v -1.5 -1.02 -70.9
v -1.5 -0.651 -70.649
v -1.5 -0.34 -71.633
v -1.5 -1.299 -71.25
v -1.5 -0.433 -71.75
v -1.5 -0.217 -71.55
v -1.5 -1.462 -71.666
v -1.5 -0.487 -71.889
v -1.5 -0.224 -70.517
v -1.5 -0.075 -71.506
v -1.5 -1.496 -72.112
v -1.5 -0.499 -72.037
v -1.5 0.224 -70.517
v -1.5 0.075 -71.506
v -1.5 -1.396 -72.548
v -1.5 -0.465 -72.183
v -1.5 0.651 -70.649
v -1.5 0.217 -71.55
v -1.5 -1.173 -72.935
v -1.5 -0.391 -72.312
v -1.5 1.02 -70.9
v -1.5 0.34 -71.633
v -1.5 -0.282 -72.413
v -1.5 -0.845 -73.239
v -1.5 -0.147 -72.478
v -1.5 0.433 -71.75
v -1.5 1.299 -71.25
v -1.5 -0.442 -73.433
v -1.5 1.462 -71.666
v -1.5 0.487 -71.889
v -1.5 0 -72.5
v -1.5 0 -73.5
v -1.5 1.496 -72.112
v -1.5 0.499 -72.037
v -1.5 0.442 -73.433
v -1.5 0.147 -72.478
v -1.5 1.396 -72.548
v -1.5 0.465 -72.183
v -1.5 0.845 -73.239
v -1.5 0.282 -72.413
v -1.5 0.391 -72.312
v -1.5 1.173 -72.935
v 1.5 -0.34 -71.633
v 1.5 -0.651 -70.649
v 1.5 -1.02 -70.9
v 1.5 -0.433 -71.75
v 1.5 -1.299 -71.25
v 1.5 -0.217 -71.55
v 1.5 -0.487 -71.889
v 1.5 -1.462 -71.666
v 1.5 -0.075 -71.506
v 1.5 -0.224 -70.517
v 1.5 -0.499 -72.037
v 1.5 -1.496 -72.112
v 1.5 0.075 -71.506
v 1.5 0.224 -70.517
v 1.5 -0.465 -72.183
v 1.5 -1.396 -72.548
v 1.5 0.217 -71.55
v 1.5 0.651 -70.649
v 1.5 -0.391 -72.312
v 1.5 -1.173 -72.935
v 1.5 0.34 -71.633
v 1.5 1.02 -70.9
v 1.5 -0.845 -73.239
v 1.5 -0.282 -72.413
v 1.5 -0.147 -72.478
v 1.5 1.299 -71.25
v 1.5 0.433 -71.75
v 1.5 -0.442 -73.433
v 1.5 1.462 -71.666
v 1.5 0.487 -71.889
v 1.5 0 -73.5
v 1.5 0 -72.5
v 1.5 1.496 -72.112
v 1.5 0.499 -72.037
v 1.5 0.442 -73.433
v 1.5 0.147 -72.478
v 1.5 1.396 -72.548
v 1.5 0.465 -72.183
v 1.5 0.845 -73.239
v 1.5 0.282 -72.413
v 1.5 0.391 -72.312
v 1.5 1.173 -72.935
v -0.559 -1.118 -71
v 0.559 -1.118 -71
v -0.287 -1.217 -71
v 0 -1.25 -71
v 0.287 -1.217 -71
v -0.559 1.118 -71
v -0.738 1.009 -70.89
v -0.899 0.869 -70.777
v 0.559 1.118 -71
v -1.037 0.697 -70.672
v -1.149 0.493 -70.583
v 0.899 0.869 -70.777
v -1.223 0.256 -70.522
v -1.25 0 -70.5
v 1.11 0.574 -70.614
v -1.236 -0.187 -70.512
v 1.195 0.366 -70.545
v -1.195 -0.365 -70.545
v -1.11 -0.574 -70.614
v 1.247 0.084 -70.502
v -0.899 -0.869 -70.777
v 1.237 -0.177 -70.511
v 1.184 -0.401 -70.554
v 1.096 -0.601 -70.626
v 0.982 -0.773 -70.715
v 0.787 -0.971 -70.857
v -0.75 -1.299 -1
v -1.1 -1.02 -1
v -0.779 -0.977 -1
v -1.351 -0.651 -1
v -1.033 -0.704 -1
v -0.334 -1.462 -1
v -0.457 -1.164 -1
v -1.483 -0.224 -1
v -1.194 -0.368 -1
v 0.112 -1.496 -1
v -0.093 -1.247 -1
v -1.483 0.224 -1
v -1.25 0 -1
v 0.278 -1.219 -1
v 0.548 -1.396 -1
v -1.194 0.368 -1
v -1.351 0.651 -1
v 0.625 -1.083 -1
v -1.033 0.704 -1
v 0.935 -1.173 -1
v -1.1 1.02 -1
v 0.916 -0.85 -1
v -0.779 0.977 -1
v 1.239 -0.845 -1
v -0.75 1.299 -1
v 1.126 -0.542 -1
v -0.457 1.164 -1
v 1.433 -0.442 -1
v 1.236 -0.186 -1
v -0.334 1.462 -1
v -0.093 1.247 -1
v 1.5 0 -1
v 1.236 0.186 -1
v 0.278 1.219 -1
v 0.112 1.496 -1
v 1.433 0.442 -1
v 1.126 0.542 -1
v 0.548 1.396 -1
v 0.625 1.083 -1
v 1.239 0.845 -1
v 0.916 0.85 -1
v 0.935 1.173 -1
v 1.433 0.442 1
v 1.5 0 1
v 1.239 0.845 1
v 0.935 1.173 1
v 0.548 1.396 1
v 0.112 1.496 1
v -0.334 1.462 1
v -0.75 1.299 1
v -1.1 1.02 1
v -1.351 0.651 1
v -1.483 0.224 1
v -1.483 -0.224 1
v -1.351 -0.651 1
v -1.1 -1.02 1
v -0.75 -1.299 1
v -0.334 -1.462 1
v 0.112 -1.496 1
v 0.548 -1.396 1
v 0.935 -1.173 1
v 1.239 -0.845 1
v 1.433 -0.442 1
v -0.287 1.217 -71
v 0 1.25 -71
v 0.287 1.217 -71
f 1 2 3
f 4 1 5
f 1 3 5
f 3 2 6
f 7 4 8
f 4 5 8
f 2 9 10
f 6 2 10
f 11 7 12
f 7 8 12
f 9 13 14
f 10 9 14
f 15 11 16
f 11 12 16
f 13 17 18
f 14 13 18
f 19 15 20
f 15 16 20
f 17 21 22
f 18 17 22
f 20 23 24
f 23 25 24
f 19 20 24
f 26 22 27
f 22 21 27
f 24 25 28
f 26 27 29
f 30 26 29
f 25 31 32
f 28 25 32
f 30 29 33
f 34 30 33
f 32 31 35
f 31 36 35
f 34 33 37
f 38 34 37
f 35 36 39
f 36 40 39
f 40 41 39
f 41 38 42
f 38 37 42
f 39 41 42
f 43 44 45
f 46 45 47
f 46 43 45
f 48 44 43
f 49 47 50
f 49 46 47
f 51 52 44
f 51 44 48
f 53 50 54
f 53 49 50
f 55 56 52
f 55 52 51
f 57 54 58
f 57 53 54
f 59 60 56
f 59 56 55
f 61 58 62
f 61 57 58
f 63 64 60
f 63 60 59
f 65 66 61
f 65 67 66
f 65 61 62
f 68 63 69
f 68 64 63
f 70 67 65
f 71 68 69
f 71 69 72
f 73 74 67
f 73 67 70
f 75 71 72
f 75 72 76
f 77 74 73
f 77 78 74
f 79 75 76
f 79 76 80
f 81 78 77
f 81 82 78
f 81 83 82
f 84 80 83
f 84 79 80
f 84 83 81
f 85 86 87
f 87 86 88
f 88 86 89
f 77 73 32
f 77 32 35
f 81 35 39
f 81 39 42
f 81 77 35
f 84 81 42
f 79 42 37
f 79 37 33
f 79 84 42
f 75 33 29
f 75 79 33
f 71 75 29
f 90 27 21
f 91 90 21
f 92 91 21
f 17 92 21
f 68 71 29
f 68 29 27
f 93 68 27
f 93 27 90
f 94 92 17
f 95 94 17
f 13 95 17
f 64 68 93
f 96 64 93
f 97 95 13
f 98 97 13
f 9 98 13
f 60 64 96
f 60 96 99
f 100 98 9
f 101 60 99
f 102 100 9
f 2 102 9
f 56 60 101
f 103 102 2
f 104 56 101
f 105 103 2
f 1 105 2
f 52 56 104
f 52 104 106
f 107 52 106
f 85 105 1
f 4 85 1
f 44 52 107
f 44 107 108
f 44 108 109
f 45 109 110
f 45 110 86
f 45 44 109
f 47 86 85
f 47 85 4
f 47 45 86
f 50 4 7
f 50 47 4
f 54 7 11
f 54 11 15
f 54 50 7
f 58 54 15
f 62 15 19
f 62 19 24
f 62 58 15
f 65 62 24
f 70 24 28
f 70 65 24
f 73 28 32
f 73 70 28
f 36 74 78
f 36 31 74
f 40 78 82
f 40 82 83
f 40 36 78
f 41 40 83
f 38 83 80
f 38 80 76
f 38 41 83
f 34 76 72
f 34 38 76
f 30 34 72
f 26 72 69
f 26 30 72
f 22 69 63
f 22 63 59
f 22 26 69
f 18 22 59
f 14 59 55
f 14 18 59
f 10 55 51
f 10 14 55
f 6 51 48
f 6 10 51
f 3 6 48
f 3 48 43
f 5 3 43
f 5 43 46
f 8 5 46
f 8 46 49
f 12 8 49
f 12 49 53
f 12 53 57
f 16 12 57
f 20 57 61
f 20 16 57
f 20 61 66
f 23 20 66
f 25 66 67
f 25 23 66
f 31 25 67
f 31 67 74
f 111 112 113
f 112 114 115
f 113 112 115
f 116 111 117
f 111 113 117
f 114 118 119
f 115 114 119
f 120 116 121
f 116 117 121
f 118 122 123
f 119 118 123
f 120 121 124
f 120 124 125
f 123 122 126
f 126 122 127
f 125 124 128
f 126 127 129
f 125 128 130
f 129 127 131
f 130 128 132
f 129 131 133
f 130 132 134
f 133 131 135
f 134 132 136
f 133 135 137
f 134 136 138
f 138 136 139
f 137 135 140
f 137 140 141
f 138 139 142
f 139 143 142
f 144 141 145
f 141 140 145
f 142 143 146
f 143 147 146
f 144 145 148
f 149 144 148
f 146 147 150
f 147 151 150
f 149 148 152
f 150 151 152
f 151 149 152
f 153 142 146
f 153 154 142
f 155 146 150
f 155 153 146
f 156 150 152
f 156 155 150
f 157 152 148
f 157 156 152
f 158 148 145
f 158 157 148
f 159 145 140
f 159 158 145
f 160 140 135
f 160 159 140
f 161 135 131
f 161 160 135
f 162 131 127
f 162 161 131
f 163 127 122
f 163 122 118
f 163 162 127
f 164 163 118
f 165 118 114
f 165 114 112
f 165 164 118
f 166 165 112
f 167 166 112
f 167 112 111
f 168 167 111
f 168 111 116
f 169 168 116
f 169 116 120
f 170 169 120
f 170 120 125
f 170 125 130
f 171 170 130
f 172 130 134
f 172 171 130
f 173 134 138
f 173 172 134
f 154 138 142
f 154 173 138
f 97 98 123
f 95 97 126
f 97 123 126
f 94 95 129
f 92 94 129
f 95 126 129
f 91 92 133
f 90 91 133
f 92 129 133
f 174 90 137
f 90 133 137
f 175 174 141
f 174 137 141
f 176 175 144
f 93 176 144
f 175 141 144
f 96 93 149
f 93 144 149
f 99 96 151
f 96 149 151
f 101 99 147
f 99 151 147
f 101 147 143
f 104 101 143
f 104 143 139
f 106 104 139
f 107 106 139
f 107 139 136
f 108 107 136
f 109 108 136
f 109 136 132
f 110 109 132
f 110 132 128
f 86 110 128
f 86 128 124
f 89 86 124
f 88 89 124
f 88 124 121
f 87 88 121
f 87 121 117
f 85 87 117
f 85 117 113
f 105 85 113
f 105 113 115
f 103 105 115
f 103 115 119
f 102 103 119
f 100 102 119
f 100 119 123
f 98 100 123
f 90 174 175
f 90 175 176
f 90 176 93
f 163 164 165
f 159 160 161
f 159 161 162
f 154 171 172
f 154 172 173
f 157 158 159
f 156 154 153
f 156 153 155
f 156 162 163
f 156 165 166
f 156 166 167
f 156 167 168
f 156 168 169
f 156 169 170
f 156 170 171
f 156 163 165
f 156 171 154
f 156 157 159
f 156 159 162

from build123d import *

# Parameters (mm, degrees)
IZIM1_R                     = 1.5
Y_KSEKLIK_EKSTR_ZYON1_DEPTH = 1
IZIM2_R                     = 1.25
Y_KSEKLIK_EKSTR_ZYON2_DEPTH = 70
IZIM5_R                     = 1.5
IZIM5_R_2                   = 0.5
Y_KSEKLIK_EKSTR_ZYON5_DEPTH = 1.5


with BuildPart() as part:
    # Çizim1 → Yükseklik-Ekstrüzyon1 (new body, symmetric)
    with BuildSketch(Plane.XY):
        Circle(IZIM1_R)
    extrude(amount=Y_KSEKLIK_EKSTR_ZYON1_DEPTH, both=True)

    # Çizim2 → Yükseklik-Ekstrüzyon2 (add)
    with BuildSketch(Plane(origin=(0, 0, -1), x_dir=(-1, 0, 0), z_dir=(0, 0, -1))):
        Circle(IZIM2_R)
    extrude(amount=Y_KSEKLIK_EKSTR_ZYON2_DEPTH)

    # Çizim5 → Yükseklik-Ekstrüzyon5 (add, symmetric)
    with BuildSketch(Plane(origin=(0, 0, 0), x_dir=(0, 0, -1), z_dir=(1, 0, 0))):
        with Locations((72, 0)):
            Circle(IZIM5_R)
        with Locations((72, 0)):
            Circle(IZIM5_R_2, mode=Mode.SUBTRACT)
    extrude(amount=Y_KSEKLIK_EKSTR_ZYON5_DEPTH, both=True)


solid = part.part
